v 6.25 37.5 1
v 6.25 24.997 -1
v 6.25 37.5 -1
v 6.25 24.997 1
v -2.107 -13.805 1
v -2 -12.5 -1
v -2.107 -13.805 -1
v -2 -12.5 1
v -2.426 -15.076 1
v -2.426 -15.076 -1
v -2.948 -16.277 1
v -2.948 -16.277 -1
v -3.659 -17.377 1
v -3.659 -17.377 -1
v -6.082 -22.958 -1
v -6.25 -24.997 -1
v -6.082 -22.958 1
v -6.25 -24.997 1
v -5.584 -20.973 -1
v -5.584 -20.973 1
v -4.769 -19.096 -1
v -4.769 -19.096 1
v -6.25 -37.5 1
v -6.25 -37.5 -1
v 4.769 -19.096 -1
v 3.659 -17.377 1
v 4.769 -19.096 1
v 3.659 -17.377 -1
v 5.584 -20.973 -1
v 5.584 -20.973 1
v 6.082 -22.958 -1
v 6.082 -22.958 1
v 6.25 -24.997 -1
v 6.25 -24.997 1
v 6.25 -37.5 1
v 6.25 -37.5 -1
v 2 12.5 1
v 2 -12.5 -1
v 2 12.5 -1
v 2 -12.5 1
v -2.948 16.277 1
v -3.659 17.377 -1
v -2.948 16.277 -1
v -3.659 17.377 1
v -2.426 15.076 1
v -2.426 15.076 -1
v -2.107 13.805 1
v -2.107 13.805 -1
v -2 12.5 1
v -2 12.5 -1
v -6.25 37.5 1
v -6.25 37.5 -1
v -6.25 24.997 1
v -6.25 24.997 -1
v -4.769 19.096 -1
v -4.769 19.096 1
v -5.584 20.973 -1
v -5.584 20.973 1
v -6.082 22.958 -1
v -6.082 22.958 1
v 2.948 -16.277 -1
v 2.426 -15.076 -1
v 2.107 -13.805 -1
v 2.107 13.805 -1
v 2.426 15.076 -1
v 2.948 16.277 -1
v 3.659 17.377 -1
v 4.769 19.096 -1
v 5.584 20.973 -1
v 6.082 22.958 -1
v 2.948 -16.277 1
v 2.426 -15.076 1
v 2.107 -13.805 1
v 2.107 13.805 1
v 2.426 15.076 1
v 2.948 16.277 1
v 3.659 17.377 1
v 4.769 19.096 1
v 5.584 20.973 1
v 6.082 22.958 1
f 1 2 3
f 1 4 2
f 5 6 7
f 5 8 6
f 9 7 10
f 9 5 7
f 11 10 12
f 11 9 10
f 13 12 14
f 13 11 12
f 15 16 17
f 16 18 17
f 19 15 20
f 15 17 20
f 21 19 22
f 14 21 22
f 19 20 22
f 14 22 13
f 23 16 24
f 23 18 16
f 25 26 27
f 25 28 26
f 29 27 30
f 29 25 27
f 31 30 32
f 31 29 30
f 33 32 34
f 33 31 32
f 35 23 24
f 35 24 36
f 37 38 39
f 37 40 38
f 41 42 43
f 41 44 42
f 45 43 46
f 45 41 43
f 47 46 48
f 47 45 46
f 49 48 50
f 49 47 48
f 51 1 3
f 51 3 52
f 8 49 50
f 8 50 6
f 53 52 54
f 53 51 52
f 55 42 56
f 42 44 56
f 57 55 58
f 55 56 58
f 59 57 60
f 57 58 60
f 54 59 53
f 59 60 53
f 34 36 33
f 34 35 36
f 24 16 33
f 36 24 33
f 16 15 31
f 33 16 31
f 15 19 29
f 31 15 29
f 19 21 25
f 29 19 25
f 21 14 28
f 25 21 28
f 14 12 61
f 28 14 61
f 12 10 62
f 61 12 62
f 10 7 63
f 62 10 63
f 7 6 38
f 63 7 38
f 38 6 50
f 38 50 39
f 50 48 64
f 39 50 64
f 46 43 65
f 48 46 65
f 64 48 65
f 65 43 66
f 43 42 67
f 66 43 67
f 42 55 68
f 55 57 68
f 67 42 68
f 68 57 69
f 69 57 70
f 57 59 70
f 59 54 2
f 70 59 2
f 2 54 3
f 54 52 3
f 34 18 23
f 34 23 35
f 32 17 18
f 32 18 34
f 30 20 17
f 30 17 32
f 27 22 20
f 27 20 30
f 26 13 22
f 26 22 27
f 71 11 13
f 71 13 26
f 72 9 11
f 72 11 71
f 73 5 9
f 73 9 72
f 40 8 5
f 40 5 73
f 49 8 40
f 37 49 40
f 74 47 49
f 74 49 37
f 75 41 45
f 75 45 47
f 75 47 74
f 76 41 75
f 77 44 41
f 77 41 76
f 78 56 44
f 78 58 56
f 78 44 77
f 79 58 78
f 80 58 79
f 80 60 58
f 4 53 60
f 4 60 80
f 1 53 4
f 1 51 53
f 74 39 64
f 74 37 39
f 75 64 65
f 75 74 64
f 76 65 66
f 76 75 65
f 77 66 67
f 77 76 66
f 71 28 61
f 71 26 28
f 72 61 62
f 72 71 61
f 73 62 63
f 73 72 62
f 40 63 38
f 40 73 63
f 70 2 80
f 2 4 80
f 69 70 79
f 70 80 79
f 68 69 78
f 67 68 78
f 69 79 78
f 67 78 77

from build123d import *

# Parameters (mm, degrees)
STREKKPR_VE_DEPTH = 1
FILLET1_R         = 12.5


with BuildPart() as part:
    # Sketch1 → Strekkprøve (new, symmetric)
    with BuildSketch(Plane.XY):
        with BuildLine():
            Line((2, -12.5), (2, 12.5))
            ThreePointArc((2, 12.5), (3.1443454, 16.623105626), (6.25, 19.566647013))
            Line((6.25, 19.566647013), (6.25, 37.5))
            Line((6.25, 37.5), (-6.25, 37.5))
            Line((-6.25, 37.5), (-6.25, 19.566647013))
            ThreePointArc((-6.25, 19.566647013), (-3.1443454, 16.623105626), (-2, 12.5))
            Line((-2, 12.5), (-2, -12.5))
            ThreePointArc((-2, -12.5), (-3.1443454, -16.623105626), (-6.25, -19.566647013))
            Line((-6.25, -19.566647013), (-6.25, -37.5))
            Line((-6.25, -37.5), (6.25, -37.5))
            Line((6.25, -37.5), (6.25, -19.566647013))
            ThreePointArc((6.25, -19.566647013), (3.1443454, -16.623105626), (2, -12.5))
        make_face()
    extrude(amount=STREKKPR_VE_DEPTH, both=True)

    # Fillet1
    fillet1_edges = [part.edges().sort_by_distance(p)[0] for p in [
        (6.25, -19.566647013, 0),
        (-6.25, -19.566647013, 0),
        (-6.25, 19.566647013, 0),
        (6.25, 19.566647013, 0),
    ]]
    fillet(fillet1_edges, radius=FILLET1_R)


solid = part.part
